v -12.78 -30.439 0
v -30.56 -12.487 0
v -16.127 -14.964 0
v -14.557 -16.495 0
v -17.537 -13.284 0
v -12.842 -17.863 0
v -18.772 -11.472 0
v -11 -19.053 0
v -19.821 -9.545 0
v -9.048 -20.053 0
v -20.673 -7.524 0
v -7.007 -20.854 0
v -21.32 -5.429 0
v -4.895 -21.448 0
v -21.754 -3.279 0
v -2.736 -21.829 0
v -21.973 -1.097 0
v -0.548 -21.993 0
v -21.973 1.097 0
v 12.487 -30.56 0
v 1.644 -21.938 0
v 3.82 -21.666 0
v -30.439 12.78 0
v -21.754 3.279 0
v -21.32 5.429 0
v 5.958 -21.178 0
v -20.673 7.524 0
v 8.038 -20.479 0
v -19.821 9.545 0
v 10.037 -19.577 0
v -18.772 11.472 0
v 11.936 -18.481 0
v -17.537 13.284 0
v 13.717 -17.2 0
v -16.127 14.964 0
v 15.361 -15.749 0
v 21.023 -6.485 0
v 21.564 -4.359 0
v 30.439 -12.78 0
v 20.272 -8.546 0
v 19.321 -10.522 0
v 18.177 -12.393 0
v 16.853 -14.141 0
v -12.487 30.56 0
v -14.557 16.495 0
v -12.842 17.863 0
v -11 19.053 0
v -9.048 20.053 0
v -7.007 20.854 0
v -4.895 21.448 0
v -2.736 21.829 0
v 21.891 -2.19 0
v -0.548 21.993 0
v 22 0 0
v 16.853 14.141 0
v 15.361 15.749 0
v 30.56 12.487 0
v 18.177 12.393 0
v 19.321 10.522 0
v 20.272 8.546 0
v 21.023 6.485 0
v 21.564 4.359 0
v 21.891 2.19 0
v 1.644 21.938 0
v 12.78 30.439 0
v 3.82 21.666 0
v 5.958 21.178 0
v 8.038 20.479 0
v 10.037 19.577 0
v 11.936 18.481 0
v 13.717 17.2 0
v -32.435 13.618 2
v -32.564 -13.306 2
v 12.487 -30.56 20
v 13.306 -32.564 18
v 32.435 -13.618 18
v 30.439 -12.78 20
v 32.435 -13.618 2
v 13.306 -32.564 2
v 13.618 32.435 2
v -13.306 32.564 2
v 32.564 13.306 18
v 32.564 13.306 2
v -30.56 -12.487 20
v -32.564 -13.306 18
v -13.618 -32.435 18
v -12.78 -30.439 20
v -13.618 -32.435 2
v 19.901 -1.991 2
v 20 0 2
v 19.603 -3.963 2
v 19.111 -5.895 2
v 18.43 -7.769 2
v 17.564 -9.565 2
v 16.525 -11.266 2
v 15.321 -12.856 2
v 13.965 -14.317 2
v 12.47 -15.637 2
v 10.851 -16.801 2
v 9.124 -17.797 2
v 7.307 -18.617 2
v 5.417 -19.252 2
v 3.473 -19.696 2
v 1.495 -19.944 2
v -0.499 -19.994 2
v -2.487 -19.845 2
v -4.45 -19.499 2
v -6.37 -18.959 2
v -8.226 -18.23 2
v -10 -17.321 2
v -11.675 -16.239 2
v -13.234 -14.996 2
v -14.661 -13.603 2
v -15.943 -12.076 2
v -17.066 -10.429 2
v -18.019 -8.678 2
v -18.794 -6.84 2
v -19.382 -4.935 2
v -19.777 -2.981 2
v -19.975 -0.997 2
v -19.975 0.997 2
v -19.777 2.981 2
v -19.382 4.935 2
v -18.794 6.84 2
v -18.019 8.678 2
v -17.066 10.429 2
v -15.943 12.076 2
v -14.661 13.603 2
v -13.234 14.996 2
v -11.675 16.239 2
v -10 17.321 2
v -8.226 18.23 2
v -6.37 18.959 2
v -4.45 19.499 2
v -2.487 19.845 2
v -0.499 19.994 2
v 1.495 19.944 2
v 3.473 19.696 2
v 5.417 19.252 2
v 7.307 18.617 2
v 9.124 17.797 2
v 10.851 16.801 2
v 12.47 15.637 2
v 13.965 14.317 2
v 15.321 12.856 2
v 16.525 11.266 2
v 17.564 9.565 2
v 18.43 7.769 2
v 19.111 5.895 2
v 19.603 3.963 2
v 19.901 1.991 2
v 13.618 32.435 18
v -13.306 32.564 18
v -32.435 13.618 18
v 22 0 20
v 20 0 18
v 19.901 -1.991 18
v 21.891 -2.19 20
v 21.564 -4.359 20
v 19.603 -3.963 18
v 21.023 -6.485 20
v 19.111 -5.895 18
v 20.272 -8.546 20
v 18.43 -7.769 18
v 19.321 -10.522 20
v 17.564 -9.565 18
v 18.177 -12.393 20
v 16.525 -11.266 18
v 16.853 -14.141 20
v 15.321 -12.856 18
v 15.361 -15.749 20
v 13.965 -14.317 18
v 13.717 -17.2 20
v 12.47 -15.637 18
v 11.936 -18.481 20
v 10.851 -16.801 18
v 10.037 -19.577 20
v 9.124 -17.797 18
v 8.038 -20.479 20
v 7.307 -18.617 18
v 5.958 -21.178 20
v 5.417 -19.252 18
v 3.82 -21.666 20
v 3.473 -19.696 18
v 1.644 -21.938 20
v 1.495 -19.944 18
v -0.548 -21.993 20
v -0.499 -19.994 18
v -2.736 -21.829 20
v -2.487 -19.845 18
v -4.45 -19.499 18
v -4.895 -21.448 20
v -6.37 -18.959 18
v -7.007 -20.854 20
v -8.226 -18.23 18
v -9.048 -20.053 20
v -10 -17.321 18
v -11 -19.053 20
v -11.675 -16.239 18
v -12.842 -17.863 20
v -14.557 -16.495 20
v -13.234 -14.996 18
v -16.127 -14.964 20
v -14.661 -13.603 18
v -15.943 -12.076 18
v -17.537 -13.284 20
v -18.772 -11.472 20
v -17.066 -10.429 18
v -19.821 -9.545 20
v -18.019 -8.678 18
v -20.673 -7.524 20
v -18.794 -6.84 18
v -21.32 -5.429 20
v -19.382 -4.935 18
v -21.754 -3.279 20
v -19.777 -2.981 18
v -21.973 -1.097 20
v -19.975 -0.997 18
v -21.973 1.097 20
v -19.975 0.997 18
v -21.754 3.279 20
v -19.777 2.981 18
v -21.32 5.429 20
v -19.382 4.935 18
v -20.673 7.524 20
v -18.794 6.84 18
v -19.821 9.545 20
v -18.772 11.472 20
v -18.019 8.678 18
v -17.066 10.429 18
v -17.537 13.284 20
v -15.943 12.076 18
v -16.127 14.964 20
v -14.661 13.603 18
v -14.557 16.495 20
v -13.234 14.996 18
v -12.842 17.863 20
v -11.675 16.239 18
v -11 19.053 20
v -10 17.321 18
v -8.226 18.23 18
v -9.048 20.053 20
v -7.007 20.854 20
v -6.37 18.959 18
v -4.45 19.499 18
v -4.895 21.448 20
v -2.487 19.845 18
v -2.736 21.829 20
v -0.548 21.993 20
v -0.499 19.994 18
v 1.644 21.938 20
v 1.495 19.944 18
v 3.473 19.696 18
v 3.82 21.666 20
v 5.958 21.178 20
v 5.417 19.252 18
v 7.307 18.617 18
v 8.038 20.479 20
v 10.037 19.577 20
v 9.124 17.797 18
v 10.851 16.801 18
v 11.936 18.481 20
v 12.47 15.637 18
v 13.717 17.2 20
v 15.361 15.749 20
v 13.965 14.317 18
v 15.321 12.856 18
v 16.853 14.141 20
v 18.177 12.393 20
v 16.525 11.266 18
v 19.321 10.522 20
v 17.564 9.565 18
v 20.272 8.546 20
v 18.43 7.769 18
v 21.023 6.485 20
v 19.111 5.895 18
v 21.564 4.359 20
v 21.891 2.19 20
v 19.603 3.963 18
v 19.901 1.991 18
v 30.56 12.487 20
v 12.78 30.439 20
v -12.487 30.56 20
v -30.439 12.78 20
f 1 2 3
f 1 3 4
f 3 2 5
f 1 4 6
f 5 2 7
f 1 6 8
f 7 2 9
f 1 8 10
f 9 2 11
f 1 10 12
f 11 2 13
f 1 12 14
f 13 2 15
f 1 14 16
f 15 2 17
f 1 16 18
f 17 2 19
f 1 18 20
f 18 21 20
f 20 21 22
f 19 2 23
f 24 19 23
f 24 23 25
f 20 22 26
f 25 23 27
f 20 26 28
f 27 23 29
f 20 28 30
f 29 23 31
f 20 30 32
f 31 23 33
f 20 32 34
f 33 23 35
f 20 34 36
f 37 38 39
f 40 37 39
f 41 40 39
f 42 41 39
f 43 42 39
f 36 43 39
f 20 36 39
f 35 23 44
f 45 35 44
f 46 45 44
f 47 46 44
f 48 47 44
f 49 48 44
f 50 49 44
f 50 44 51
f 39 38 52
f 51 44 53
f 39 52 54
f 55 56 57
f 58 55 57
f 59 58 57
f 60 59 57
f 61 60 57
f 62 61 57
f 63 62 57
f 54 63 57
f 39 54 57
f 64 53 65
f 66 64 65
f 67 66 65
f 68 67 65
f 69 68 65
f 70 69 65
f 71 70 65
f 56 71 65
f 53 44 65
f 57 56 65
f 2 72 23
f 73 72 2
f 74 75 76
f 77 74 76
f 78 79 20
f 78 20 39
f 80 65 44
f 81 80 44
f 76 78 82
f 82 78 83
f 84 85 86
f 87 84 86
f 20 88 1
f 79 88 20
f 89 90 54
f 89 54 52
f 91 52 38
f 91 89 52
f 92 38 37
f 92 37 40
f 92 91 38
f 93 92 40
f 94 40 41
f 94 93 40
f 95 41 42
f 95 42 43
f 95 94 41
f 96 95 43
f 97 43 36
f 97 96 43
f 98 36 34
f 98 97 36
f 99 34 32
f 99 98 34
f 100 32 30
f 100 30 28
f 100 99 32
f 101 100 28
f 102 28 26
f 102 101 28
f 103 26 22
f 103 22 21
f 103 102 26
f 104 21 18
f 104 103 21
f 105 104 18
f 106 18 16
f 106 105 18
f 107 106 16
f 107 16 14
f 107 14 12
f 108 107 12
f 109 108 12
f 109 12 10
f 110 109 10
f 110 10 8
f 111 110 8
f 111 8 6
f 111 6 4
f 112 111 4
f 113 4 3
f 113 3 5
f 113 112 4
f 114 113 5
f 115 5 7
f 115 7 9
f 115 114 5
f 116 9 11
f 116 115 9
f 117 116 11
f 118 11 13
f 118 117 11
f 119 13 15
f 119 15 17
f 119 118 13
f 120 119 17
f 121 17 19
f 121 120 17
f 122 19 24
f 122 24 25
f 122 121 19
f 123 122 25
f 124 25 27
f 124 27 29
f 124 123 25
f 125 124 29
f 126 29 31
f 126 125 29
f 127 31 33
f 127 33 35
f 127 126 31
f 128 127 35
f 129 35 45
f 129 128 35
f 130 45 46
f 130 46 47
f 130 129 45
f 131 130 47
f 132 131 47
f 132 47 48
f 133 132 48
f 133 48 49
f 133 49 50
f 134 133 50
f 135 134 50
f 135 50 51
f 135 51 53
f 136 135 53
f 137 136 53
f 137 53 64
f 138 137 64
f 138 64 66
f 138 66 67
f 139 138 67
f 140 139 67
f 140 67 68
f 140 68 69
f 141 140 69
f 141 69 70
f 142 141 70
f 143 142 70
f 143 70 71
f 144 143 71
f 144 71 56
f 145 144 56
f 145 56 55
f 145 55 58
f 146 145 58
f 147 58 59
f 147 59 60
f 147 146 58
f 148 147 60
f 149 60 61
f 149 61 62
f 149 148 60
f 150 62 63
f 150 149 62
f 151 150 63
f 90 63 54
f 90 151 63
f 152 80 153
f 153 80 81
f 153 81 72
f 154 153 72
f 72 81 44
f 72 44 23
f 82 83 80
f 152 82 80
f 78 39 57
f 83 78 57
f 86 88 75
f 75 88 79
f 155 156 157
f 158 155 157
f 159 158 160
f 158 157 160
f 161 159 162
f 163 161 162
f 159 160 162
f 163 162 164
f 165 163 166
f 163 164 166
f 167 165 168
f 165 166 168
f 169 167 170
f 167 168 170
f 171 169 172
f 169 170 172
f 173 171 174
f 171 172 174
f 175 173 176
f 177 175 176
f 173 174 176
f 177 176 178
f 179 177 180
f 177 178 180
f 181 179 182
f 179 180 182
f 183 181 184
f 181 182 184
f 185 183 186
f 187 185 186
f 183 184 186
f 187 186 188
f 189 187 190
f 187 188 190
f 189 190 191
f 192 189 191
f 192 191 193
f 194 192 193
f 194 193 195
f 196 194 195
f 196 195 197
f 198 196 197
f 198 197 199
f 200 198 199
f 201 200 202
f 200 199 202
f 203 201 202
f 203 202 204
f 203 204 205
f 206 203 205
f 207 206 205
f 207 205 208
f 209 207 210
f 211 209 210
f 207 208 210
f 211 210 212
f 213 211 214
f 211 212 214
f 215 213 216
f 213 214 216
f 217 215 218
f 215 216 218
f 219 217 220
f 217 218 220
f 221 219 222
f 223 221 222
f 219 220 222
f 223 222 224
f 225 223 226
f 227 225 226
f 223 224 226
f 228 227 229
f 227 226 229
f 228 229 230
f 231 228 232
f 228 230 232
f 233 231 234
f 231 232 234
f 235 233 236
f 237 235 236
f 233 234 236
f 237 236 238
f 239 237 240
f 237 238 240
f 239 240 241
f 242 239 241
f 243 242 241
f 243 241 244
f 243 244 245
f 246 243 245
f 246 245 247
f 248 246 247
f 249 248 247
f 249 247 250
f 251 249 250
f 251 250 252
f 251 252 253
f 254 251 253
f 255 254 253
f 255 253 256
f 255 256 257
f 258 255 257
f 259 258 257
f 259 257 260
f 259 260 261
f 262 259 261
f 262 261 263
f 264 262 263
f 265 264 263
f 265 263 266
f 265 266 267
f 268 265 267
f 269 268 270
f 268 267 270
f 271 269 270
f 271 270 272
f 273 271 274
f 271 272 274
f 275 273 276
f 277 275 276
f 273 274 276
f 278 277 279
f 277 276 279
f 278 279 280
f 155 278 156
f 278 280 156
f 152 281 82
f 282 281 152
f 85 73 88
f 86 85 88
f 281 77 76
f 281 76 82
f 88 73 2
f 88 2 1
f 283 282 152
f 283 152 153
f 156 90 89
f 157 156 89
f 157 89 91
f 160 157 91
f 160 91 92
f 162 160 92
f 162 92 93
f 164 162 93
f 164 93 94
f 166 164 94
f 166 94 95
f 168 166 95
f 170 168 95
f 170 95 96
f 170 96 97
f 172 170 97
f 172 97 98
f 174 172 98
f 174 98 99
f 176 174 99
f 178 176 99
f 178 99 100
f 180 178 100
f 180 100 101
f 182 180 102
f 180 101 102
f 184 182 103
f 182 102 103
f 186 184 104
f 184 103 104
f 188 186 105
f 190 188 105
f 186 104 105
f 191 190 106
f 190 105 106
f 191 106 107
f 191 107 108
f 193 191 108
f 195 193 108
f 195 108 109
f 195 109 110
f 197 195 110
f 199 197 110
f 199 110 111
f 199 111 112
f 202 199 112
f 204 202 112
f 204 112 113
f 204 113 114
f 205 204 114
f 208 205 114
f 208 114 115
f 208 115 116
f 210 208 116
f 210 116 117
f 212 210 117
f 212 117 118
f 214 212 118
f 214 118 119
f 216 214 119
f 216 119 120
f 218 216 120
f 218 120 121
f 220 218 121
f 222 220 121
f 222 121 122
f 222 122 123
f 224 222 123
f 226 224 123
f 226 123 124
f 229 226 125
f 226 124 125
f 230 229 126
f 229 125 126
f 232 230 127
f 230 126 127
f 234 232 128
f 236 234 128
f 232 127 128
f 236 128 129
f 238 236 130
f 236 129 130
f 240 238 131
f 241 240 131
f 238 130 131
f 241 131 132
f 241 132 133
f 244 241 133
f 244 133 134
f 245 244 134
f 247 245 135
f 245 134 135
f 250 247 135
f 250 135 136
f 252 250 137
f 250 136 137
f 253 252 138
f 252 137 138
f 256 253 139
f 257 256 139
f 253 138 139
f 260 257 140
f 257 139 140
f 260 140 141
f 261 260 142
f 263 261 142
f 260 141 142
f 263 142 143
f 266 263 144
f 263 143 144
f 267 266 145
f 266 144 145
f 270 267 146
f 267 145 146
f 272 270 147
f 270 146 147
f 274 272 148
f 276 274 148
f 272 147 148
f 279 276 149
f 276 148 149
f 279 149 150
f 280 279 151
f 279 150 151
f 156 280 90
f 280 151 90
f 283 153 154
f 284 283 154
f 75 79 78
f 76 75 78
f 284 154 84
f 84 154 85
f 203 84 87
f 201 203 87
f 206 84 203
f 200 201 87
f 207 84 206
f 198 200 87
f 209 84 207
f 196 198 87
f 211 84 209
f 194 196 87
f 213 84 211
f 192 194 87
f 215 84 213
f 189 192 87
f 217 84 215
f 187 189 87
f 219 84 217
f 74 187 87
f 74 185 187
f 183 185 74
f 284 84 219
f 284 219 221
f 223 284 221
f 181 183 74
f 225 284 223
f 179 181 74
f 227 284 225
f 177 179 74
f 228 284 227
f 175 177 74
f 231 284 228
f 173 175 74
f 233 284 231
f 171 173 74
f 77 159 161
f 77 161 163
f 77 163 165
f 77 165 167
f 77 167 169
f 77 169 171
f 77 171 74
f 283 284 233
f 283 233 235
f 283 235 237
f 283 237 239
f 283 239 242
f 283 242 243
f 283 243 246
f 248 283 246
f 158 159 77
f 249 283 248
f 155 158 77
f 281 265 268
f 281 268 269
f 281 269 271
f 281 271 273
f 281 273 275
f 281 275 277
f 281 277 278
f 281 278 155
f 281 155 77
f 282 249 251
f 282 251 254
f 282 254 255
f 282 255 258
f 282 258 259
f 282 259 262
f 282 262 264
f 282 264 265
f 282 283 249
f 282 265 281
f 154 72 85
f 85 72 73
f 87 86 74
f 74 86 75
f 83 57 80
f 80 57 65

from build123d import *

# Parameters (mm, degrees)
F1_DEPTH = 20
F2_R     = 20
F3_DEPTH = 20.001
F4_SIZE  = 2


with BuildPart() as f1:
    # F0 (on Top) → F1 (new body)
    with BuildSketch(Plane.XY):
        Polygon((32.5642426406, 13.3057863628), (13.6177850292, 32.4350085615), (-13.3057863628, 32.5642426406), (-32.4350085615, 13.6177850292), (-32.5642426406, -13.3057863628), (-13.6177850292, -32.4350085615), (13.3057863628, -32.5642426406), (32.4350085615, -13.6177850292), align=None)
    extrude(amount=F1_DEPTH)

    # F2 (on face) → F3 (cut, through all)
    with BuildSketch(Plane(origin=(0, 0, 0), x_dir=(1, 0, 0), z_dir=(0, 0, -1))):
        Circle(F2_R)
    extrude(amount=-F3_DEPTH, mode=Mode.SUBTRACT)

    # F4
    f4_edges = [f1.edges().sort_by_distance(p)[0] for p in [
        (23.091014, 22.870397, 20),
        (32.499626, -0.155999, 20),
        (0.155999, 32.499626, 20),
        (22.870397, -23.091014, 20),
        (-22.870397, 23.091014, 20),
        (-0.155999, -32.499626, 20),
        (-32.499626, 0.155999, 20),
        (-23.091014, -22.870397, 20),
        (-20, 0, 20),
        (23.091014, 22.870397, 0),
        (32.499626, -0.155999, 0),
        (0.155999, 32.499626, 0),
        (22.870397, -23.091014, 0),
        (-22.870397, 23.091014, 0),
        (-0.155999, -32.499626, 0),
        (-32.499626, 0.155999, 0),
        (-23.091014, -22.870397, 0),
        (-20, 0, 0),
    ]]
    chamfer(f4_edges, length=F4_SIZE)


solid = f1.part
